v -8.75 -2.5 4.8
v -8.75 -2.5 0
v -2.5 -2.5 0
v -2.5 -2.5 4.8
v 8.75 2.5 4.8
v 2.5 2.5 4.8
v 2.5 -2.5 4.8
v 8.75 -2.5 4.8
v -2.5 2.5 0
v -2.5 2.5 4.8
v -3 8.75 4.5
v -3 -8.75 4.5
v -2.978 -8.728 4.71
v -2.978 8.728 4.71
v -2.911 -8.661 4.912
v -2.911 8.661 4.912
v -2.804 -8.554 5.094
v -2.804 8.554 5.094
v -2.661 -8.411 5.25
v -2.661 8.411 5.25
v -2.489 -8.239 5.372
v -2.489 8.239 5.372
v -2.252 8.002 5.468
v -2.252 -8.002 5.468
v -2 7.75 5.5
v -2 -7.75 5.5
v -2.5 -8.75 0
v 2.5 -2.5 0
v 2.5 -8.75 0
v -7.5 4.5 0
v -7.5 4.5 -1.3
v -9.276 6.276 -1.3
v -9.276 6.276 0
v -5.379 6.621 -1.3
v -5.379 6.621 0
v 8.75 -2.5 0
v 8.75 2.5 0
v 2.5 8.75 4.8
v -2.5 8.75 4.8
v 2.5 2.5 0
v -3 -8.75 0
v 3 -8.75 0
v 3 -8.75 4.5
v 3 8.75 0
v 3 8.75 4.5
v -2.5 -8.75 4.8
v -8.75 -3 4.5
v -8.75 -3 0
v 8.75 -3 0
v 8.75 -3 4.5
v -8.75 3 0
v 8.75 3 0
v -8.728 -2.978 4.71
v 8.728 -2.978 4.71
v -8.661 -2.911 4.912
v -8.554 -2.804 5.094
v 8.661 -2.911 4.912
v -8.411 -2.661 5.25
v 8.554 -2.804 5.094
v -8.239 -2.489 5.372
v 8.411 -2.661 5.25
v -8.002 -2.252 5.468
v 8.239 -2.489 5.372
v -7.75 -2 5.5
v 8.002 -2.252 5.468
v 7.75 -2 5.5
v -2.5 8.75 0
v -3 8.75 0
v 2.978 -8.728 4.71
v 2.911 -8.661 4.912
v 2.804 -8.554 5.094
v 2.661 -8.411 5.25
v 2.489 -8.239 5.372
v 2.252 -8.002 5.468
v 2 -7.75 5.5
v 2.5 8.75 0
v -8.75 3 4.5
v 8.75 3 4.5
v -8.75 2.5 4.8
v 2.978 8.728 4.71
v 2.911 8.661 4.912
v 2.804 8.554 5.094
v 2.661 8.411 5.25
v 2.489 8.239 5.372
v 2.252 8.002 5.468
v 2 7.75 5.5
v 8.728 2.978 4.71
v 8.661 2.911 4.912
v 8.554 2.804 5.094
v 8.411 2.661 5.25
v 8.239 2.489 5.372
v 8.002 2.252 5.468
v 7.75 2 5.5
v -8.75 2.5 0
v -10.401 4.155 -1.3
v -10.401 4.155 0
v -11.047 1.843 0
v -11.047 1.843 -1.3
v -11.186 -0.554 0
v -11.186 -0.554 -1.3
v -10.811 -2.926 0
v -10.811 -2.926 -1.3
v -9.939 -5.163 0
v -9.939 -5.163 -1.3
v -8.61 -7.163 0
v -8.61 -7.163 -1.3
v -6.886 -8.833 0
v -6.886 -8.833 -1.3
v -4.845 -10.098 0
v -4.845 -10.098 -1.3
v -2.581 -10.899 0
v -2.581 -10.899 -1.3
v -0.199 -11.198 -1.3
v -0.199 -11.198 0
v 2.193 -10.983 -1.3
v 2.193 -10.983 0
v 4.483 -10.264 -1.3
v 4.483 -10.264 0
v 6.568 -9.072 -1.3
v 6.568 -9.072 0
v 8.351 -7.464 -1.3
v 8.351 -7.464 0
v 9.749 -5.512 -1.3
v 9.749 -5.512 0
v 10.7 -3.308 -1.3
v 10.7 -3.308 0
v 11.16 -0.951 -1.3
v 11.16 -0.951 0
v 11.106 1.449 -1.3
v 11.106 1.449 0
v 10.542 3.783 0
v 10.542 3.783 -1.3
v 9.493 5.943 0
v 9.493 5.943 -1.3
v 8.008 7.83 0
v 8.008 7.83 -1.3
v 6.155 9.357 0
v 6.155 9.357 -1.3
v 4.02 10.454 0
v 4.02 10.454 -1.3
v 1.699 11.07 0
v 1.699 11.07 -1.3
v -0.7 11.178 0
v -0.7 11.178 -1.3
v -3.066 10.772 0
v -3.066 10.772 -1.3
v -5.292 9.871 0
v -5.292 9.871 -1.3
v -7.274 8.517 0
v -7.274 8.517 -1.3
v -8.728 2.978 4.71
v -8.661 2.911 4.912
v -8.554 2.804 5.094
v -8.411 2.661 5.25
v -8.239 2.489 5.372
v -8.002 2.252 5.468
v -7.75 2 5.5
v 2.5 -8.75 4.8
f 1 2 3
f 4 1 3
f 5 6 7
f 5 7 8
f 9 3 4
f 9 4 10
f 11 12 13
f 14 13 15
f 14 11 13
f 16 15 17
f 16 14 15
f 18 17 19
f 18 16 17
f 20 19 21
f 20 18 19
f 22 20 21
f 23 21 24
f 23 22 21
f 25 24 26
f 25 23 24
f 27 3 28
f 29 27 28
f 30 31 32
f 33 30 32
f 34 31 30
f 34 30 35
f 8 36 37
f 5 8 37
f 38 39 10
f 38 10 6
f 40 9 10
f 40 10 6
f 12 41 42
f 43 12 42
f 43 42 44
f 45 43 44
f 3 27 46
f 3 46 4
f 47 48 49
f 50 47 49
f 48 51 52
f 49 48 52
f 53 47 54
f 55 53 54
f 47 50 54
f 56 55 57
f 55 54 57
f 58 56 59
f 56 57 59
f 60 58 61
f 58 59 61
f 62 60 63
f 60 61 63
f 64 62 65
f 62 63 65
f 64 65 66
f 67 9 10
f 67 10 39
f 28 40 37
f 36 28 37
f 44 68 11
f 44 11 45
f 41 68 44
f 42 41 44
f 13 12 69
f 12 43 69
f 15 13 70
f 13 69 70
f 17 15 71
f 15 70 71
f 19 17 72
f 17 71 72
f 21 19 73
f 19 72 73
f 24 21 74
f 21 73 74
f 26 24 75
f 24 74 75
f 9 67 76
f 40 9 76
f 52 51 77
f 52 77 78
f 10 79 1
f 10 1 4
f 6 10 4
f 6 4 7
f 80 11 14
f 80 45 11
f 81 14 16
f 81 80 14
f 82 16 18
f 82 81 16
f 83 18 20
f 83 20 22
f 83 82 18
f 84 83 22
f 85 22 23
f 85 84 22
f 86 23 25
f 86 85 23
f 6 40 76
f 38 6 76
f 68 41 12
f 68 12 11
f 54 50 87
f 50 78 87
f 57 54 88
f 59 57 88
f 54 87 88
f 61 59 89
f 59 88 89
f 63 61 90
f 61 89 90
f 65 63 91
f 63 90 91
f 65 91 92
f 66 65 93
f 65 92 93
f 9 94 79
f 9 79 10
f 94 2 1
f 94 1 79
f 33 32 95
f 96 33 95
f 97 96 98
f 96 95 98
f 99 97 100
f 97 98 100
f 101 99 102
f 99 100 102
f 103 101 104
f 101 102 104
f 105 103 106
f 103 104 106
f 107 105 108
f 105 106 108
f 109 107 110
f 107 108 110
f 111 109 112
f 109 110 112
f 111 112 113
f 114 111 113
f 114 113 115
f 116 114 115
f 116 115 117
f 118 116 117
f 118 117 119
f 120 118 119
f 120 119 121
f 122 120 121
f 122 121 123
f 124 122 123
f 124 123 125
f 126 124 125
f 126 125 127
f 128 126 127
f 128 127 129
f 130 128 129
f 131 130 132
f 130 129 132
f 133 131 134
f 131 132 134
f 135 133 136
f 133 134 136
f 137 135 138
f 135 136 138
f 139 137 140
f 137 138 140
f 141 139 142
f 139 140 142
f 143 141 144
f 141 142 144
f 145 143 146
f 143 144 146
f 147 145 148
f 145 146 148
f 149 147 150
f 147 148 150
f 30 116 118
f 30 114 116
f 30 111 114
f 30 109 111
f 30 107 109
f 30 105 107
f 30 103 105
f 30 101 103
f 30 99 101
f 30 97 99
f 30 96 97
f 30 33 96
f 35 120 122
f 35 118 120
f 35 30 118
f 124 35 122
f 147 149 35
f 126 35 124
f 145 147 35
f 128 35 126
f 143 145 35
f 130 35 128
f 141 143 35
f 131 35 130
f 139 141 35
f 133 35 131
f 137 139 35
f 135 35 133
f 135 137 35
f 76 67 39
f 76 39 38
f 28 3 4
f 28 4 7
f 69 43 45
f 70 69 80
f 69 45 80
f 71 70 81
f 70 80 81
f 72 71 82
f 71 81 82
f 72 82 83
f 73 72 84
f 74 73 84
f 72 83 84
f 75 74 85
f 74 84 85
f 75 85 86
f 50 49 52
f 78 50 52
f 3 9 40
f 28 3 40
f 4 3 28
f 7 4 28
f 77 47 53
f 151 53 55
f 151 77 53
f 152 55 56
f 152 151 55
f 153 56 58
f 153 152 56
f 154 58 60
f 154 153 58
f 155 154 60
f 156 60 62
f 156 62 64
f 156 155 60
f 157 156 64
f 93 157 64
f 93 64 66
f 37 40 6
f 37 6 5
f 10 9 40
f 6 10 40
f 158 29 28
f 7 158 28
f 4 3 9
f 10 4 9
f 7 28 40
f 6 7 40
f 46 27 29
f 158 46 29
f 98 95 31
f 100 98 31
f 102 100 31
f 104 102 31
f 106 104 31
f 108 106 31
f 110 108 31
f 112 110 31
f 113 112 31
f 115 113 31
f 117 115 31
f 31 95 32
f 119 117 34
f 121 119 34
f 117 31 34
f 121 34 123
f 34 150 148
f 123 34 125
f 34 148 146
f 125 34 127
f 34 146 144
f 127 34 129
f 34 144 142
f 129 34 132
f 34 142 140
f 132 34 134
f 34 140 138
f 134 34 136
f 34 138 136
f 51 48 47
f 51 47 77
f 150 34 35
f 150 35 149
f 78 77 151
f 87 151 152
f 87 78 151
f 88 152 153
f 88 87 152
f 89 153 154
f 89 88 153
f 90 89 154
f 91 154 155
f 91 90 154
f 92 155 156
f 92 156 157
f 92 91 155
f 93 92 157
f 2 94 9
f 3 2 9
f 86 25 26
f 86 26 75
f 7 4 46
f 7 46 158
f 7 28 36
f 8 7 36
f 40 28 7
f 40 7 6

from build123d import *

# Parameters (mm, degrees)
BOX_W                  = 5
BOX_H                  = 6.25
BOX_DEPTH              = 4.8
BOX001_W               = 6.25
BOX001_H               = 5
BOX001_DEPTH           = 4.8
BOX003_W               = 5
BOX003_H               = 6.25
BOX003_DEPTH           = 4.8
BOX004_W               = 6.25
BOX004_H               = 5
BOX004_DEPTH           = 4.8
BOX005_W               = 5
BOX005_H               = 5
BOX005_DEPTH           = 4.8
BOX007_W               = 6
BOX007_H               = 17.5
BOX007_DEPTH           = 5.5
FILLET_R               = 1
BOX006_W               = 17.5
BOX006_H               = 6
BOX006_DEPTH           = 5.5
FILLET001_R            = 1
BOX002_W               = 3
BOX002_H               = 3
BOX002_DEPTH           = 10
BOX002_PLACEMENT_ANGLE = 45
CYLINDER_R             = 11.2
CYLINDER_DEPTH         = 1.3


with BuildPart() as cube_dpad_vertical_top:
    # Box → Box (new body)
    with BuildSketch(Plane(origin=(-2.5, 2.5, 0), x_dir=(1, 0, 0), z_dir=(0, 0, 1))):
        with Locations((2.5, 3.125)):
            Rectangle(BOX_W, BOX_H)
    extrude(amount=BOX_DEPTH)


with BuildPart() as cube_dpad_horizontal_left:
    # Box001 → Box001 (new body)
    with BuildSketch(Plane(origin=(-8.75, -2.5, 0), x_dir=(1, 0, 0), z_dir=(0, 0, 1))):
        with Locations((3.125, 2.5)):
            Rectangle(BOX001_W, BOX001_H)
    extrude(amount=BOX001_DEPTH)


with BuildPart() as cube_dpad_vertical_bottom:
    # Box003 → Box003 (new body)
    with BuildSketch(Plane(origin=(-2.5, -8.75, 0), x_dir=(1, 0, 0), z_dir=(0, 0, 1))):
        with Locations((2.5, 3.125)):
            Rectangle(BOX003_W, BOX003_H)
    extrude(amount=BOX003_DEPTH)


with BuildPart() as cube_dpad_horizontal_right:
    # Box004 → Box004 (new body)
    with BuildSketch(Plane(origin=(2.5, -2.5, 0), x_dir=(1, 0, 0), z_dir=(0, 0, 1))):
        with Locations((3.125, 2.5)):
            Rectangle(BOX004_W, BOX004_H)
    extrude(amount=BOX004_DEPTH)


with BuildPart() as cube_dpad_middle:
    # Box005 → Box005 (new body)
    with BuildSketch(Plane(origin=(-2.5, -2.5, 0), x_dir=(1, 0, 0), z_dir=(0, 0, 1))):
        with Locations((2.5, 2.5)):
            Rectangle(BOX005_W, BOX005_H)
    extrude(amount=BOX005_DEPTH)


with BuildPart() as fillet_body:
    # Box007 → Box007 (new body)
    with BuildSketch(Plane(origin=(-3, -8.75, 0), x_dir=(1, 0, 0), z_dir=(0, 0, 1))):
        with Locations((3, 8.75)):
            Rectangle(BOX007_W, BOX007_H)
    extrude(amount=BOX007_DEPTH)

    # Fillet
    fillet_edges = [fillet_body.edges().sort_by_distance(p)[0] for p in [
        (-3, 0, 5.5),
        (3, 0, 5.5),
        (0, -8.75, 5.5),
        (0, 8.75, 5.5),
    ]]
    fillet(fillet_edges, radius=FILLET_R)


with BuildPart() as fillet001:
    # Box006 → Box006 (new body)
    with BuildSketch(Plane(origin=(-8.75, -3, 0), x_dir=(1, 0, 0), z_dir=(0, 0, 1))):
        with Locations((8.75, 3)):
            Rectangle(BOX006_W, BOX006_H)
    extrude(amount=BOX006_DEPTH)

    # Fillet001
    fillet001_edges = [fillet001.edges().sort_by_distance(p)[0] for p in [
        (-8.75, 0, 5.5),
        (8.75, 0, 5.5),
        (0, -3, 5.5),
        (0, 3, 5.5),
    ]]
    fillet(fillet001_edges, radius=FILLET001_R)


with BuildPart() as cube_corner_cut:
    # Box002 → Box002 (new body)
    with BuildSketch(Plane.XY):
        with Locations((1.5, 1.5)):
            Rectangle(BOX002_W, BOX002_H)
    extrude(amount=BOX002_DEPTH)


with BuildPart() as cube_corner_cut_1:
    # Box002 placement: moved
    add(cube_corner_cut.part.moved(Location((-7.5, 4.5, -1.3))).rotate(Axis((-7.5, 4.5, -1.3), (0, 0, 1)), BOX002_PLACEMENT_ANGLE))


with BuildPart() as cut:
    # Cylinder → Cylinder (new body)
    with BuildSketch(Plane.XY.offset(-1.3)):
        Circle(CYLINDER_R)
    extrude(amount=CYLINDER_DEPTH)

    # Cut: cut Cube(corner_cut)
    add(cube_corner_cut_1.part, mode=Mode.SUBTRACT)


solid = Compound([cube_dpad_vertical_top.part, cube_dpad_horizontal_left.part, cube_dpad_vertical_bottom.part, cube_dpad_horizontal_right.part, cube_dpad_middle.part, fillet_body.part, fillet001.part, cut.part])
